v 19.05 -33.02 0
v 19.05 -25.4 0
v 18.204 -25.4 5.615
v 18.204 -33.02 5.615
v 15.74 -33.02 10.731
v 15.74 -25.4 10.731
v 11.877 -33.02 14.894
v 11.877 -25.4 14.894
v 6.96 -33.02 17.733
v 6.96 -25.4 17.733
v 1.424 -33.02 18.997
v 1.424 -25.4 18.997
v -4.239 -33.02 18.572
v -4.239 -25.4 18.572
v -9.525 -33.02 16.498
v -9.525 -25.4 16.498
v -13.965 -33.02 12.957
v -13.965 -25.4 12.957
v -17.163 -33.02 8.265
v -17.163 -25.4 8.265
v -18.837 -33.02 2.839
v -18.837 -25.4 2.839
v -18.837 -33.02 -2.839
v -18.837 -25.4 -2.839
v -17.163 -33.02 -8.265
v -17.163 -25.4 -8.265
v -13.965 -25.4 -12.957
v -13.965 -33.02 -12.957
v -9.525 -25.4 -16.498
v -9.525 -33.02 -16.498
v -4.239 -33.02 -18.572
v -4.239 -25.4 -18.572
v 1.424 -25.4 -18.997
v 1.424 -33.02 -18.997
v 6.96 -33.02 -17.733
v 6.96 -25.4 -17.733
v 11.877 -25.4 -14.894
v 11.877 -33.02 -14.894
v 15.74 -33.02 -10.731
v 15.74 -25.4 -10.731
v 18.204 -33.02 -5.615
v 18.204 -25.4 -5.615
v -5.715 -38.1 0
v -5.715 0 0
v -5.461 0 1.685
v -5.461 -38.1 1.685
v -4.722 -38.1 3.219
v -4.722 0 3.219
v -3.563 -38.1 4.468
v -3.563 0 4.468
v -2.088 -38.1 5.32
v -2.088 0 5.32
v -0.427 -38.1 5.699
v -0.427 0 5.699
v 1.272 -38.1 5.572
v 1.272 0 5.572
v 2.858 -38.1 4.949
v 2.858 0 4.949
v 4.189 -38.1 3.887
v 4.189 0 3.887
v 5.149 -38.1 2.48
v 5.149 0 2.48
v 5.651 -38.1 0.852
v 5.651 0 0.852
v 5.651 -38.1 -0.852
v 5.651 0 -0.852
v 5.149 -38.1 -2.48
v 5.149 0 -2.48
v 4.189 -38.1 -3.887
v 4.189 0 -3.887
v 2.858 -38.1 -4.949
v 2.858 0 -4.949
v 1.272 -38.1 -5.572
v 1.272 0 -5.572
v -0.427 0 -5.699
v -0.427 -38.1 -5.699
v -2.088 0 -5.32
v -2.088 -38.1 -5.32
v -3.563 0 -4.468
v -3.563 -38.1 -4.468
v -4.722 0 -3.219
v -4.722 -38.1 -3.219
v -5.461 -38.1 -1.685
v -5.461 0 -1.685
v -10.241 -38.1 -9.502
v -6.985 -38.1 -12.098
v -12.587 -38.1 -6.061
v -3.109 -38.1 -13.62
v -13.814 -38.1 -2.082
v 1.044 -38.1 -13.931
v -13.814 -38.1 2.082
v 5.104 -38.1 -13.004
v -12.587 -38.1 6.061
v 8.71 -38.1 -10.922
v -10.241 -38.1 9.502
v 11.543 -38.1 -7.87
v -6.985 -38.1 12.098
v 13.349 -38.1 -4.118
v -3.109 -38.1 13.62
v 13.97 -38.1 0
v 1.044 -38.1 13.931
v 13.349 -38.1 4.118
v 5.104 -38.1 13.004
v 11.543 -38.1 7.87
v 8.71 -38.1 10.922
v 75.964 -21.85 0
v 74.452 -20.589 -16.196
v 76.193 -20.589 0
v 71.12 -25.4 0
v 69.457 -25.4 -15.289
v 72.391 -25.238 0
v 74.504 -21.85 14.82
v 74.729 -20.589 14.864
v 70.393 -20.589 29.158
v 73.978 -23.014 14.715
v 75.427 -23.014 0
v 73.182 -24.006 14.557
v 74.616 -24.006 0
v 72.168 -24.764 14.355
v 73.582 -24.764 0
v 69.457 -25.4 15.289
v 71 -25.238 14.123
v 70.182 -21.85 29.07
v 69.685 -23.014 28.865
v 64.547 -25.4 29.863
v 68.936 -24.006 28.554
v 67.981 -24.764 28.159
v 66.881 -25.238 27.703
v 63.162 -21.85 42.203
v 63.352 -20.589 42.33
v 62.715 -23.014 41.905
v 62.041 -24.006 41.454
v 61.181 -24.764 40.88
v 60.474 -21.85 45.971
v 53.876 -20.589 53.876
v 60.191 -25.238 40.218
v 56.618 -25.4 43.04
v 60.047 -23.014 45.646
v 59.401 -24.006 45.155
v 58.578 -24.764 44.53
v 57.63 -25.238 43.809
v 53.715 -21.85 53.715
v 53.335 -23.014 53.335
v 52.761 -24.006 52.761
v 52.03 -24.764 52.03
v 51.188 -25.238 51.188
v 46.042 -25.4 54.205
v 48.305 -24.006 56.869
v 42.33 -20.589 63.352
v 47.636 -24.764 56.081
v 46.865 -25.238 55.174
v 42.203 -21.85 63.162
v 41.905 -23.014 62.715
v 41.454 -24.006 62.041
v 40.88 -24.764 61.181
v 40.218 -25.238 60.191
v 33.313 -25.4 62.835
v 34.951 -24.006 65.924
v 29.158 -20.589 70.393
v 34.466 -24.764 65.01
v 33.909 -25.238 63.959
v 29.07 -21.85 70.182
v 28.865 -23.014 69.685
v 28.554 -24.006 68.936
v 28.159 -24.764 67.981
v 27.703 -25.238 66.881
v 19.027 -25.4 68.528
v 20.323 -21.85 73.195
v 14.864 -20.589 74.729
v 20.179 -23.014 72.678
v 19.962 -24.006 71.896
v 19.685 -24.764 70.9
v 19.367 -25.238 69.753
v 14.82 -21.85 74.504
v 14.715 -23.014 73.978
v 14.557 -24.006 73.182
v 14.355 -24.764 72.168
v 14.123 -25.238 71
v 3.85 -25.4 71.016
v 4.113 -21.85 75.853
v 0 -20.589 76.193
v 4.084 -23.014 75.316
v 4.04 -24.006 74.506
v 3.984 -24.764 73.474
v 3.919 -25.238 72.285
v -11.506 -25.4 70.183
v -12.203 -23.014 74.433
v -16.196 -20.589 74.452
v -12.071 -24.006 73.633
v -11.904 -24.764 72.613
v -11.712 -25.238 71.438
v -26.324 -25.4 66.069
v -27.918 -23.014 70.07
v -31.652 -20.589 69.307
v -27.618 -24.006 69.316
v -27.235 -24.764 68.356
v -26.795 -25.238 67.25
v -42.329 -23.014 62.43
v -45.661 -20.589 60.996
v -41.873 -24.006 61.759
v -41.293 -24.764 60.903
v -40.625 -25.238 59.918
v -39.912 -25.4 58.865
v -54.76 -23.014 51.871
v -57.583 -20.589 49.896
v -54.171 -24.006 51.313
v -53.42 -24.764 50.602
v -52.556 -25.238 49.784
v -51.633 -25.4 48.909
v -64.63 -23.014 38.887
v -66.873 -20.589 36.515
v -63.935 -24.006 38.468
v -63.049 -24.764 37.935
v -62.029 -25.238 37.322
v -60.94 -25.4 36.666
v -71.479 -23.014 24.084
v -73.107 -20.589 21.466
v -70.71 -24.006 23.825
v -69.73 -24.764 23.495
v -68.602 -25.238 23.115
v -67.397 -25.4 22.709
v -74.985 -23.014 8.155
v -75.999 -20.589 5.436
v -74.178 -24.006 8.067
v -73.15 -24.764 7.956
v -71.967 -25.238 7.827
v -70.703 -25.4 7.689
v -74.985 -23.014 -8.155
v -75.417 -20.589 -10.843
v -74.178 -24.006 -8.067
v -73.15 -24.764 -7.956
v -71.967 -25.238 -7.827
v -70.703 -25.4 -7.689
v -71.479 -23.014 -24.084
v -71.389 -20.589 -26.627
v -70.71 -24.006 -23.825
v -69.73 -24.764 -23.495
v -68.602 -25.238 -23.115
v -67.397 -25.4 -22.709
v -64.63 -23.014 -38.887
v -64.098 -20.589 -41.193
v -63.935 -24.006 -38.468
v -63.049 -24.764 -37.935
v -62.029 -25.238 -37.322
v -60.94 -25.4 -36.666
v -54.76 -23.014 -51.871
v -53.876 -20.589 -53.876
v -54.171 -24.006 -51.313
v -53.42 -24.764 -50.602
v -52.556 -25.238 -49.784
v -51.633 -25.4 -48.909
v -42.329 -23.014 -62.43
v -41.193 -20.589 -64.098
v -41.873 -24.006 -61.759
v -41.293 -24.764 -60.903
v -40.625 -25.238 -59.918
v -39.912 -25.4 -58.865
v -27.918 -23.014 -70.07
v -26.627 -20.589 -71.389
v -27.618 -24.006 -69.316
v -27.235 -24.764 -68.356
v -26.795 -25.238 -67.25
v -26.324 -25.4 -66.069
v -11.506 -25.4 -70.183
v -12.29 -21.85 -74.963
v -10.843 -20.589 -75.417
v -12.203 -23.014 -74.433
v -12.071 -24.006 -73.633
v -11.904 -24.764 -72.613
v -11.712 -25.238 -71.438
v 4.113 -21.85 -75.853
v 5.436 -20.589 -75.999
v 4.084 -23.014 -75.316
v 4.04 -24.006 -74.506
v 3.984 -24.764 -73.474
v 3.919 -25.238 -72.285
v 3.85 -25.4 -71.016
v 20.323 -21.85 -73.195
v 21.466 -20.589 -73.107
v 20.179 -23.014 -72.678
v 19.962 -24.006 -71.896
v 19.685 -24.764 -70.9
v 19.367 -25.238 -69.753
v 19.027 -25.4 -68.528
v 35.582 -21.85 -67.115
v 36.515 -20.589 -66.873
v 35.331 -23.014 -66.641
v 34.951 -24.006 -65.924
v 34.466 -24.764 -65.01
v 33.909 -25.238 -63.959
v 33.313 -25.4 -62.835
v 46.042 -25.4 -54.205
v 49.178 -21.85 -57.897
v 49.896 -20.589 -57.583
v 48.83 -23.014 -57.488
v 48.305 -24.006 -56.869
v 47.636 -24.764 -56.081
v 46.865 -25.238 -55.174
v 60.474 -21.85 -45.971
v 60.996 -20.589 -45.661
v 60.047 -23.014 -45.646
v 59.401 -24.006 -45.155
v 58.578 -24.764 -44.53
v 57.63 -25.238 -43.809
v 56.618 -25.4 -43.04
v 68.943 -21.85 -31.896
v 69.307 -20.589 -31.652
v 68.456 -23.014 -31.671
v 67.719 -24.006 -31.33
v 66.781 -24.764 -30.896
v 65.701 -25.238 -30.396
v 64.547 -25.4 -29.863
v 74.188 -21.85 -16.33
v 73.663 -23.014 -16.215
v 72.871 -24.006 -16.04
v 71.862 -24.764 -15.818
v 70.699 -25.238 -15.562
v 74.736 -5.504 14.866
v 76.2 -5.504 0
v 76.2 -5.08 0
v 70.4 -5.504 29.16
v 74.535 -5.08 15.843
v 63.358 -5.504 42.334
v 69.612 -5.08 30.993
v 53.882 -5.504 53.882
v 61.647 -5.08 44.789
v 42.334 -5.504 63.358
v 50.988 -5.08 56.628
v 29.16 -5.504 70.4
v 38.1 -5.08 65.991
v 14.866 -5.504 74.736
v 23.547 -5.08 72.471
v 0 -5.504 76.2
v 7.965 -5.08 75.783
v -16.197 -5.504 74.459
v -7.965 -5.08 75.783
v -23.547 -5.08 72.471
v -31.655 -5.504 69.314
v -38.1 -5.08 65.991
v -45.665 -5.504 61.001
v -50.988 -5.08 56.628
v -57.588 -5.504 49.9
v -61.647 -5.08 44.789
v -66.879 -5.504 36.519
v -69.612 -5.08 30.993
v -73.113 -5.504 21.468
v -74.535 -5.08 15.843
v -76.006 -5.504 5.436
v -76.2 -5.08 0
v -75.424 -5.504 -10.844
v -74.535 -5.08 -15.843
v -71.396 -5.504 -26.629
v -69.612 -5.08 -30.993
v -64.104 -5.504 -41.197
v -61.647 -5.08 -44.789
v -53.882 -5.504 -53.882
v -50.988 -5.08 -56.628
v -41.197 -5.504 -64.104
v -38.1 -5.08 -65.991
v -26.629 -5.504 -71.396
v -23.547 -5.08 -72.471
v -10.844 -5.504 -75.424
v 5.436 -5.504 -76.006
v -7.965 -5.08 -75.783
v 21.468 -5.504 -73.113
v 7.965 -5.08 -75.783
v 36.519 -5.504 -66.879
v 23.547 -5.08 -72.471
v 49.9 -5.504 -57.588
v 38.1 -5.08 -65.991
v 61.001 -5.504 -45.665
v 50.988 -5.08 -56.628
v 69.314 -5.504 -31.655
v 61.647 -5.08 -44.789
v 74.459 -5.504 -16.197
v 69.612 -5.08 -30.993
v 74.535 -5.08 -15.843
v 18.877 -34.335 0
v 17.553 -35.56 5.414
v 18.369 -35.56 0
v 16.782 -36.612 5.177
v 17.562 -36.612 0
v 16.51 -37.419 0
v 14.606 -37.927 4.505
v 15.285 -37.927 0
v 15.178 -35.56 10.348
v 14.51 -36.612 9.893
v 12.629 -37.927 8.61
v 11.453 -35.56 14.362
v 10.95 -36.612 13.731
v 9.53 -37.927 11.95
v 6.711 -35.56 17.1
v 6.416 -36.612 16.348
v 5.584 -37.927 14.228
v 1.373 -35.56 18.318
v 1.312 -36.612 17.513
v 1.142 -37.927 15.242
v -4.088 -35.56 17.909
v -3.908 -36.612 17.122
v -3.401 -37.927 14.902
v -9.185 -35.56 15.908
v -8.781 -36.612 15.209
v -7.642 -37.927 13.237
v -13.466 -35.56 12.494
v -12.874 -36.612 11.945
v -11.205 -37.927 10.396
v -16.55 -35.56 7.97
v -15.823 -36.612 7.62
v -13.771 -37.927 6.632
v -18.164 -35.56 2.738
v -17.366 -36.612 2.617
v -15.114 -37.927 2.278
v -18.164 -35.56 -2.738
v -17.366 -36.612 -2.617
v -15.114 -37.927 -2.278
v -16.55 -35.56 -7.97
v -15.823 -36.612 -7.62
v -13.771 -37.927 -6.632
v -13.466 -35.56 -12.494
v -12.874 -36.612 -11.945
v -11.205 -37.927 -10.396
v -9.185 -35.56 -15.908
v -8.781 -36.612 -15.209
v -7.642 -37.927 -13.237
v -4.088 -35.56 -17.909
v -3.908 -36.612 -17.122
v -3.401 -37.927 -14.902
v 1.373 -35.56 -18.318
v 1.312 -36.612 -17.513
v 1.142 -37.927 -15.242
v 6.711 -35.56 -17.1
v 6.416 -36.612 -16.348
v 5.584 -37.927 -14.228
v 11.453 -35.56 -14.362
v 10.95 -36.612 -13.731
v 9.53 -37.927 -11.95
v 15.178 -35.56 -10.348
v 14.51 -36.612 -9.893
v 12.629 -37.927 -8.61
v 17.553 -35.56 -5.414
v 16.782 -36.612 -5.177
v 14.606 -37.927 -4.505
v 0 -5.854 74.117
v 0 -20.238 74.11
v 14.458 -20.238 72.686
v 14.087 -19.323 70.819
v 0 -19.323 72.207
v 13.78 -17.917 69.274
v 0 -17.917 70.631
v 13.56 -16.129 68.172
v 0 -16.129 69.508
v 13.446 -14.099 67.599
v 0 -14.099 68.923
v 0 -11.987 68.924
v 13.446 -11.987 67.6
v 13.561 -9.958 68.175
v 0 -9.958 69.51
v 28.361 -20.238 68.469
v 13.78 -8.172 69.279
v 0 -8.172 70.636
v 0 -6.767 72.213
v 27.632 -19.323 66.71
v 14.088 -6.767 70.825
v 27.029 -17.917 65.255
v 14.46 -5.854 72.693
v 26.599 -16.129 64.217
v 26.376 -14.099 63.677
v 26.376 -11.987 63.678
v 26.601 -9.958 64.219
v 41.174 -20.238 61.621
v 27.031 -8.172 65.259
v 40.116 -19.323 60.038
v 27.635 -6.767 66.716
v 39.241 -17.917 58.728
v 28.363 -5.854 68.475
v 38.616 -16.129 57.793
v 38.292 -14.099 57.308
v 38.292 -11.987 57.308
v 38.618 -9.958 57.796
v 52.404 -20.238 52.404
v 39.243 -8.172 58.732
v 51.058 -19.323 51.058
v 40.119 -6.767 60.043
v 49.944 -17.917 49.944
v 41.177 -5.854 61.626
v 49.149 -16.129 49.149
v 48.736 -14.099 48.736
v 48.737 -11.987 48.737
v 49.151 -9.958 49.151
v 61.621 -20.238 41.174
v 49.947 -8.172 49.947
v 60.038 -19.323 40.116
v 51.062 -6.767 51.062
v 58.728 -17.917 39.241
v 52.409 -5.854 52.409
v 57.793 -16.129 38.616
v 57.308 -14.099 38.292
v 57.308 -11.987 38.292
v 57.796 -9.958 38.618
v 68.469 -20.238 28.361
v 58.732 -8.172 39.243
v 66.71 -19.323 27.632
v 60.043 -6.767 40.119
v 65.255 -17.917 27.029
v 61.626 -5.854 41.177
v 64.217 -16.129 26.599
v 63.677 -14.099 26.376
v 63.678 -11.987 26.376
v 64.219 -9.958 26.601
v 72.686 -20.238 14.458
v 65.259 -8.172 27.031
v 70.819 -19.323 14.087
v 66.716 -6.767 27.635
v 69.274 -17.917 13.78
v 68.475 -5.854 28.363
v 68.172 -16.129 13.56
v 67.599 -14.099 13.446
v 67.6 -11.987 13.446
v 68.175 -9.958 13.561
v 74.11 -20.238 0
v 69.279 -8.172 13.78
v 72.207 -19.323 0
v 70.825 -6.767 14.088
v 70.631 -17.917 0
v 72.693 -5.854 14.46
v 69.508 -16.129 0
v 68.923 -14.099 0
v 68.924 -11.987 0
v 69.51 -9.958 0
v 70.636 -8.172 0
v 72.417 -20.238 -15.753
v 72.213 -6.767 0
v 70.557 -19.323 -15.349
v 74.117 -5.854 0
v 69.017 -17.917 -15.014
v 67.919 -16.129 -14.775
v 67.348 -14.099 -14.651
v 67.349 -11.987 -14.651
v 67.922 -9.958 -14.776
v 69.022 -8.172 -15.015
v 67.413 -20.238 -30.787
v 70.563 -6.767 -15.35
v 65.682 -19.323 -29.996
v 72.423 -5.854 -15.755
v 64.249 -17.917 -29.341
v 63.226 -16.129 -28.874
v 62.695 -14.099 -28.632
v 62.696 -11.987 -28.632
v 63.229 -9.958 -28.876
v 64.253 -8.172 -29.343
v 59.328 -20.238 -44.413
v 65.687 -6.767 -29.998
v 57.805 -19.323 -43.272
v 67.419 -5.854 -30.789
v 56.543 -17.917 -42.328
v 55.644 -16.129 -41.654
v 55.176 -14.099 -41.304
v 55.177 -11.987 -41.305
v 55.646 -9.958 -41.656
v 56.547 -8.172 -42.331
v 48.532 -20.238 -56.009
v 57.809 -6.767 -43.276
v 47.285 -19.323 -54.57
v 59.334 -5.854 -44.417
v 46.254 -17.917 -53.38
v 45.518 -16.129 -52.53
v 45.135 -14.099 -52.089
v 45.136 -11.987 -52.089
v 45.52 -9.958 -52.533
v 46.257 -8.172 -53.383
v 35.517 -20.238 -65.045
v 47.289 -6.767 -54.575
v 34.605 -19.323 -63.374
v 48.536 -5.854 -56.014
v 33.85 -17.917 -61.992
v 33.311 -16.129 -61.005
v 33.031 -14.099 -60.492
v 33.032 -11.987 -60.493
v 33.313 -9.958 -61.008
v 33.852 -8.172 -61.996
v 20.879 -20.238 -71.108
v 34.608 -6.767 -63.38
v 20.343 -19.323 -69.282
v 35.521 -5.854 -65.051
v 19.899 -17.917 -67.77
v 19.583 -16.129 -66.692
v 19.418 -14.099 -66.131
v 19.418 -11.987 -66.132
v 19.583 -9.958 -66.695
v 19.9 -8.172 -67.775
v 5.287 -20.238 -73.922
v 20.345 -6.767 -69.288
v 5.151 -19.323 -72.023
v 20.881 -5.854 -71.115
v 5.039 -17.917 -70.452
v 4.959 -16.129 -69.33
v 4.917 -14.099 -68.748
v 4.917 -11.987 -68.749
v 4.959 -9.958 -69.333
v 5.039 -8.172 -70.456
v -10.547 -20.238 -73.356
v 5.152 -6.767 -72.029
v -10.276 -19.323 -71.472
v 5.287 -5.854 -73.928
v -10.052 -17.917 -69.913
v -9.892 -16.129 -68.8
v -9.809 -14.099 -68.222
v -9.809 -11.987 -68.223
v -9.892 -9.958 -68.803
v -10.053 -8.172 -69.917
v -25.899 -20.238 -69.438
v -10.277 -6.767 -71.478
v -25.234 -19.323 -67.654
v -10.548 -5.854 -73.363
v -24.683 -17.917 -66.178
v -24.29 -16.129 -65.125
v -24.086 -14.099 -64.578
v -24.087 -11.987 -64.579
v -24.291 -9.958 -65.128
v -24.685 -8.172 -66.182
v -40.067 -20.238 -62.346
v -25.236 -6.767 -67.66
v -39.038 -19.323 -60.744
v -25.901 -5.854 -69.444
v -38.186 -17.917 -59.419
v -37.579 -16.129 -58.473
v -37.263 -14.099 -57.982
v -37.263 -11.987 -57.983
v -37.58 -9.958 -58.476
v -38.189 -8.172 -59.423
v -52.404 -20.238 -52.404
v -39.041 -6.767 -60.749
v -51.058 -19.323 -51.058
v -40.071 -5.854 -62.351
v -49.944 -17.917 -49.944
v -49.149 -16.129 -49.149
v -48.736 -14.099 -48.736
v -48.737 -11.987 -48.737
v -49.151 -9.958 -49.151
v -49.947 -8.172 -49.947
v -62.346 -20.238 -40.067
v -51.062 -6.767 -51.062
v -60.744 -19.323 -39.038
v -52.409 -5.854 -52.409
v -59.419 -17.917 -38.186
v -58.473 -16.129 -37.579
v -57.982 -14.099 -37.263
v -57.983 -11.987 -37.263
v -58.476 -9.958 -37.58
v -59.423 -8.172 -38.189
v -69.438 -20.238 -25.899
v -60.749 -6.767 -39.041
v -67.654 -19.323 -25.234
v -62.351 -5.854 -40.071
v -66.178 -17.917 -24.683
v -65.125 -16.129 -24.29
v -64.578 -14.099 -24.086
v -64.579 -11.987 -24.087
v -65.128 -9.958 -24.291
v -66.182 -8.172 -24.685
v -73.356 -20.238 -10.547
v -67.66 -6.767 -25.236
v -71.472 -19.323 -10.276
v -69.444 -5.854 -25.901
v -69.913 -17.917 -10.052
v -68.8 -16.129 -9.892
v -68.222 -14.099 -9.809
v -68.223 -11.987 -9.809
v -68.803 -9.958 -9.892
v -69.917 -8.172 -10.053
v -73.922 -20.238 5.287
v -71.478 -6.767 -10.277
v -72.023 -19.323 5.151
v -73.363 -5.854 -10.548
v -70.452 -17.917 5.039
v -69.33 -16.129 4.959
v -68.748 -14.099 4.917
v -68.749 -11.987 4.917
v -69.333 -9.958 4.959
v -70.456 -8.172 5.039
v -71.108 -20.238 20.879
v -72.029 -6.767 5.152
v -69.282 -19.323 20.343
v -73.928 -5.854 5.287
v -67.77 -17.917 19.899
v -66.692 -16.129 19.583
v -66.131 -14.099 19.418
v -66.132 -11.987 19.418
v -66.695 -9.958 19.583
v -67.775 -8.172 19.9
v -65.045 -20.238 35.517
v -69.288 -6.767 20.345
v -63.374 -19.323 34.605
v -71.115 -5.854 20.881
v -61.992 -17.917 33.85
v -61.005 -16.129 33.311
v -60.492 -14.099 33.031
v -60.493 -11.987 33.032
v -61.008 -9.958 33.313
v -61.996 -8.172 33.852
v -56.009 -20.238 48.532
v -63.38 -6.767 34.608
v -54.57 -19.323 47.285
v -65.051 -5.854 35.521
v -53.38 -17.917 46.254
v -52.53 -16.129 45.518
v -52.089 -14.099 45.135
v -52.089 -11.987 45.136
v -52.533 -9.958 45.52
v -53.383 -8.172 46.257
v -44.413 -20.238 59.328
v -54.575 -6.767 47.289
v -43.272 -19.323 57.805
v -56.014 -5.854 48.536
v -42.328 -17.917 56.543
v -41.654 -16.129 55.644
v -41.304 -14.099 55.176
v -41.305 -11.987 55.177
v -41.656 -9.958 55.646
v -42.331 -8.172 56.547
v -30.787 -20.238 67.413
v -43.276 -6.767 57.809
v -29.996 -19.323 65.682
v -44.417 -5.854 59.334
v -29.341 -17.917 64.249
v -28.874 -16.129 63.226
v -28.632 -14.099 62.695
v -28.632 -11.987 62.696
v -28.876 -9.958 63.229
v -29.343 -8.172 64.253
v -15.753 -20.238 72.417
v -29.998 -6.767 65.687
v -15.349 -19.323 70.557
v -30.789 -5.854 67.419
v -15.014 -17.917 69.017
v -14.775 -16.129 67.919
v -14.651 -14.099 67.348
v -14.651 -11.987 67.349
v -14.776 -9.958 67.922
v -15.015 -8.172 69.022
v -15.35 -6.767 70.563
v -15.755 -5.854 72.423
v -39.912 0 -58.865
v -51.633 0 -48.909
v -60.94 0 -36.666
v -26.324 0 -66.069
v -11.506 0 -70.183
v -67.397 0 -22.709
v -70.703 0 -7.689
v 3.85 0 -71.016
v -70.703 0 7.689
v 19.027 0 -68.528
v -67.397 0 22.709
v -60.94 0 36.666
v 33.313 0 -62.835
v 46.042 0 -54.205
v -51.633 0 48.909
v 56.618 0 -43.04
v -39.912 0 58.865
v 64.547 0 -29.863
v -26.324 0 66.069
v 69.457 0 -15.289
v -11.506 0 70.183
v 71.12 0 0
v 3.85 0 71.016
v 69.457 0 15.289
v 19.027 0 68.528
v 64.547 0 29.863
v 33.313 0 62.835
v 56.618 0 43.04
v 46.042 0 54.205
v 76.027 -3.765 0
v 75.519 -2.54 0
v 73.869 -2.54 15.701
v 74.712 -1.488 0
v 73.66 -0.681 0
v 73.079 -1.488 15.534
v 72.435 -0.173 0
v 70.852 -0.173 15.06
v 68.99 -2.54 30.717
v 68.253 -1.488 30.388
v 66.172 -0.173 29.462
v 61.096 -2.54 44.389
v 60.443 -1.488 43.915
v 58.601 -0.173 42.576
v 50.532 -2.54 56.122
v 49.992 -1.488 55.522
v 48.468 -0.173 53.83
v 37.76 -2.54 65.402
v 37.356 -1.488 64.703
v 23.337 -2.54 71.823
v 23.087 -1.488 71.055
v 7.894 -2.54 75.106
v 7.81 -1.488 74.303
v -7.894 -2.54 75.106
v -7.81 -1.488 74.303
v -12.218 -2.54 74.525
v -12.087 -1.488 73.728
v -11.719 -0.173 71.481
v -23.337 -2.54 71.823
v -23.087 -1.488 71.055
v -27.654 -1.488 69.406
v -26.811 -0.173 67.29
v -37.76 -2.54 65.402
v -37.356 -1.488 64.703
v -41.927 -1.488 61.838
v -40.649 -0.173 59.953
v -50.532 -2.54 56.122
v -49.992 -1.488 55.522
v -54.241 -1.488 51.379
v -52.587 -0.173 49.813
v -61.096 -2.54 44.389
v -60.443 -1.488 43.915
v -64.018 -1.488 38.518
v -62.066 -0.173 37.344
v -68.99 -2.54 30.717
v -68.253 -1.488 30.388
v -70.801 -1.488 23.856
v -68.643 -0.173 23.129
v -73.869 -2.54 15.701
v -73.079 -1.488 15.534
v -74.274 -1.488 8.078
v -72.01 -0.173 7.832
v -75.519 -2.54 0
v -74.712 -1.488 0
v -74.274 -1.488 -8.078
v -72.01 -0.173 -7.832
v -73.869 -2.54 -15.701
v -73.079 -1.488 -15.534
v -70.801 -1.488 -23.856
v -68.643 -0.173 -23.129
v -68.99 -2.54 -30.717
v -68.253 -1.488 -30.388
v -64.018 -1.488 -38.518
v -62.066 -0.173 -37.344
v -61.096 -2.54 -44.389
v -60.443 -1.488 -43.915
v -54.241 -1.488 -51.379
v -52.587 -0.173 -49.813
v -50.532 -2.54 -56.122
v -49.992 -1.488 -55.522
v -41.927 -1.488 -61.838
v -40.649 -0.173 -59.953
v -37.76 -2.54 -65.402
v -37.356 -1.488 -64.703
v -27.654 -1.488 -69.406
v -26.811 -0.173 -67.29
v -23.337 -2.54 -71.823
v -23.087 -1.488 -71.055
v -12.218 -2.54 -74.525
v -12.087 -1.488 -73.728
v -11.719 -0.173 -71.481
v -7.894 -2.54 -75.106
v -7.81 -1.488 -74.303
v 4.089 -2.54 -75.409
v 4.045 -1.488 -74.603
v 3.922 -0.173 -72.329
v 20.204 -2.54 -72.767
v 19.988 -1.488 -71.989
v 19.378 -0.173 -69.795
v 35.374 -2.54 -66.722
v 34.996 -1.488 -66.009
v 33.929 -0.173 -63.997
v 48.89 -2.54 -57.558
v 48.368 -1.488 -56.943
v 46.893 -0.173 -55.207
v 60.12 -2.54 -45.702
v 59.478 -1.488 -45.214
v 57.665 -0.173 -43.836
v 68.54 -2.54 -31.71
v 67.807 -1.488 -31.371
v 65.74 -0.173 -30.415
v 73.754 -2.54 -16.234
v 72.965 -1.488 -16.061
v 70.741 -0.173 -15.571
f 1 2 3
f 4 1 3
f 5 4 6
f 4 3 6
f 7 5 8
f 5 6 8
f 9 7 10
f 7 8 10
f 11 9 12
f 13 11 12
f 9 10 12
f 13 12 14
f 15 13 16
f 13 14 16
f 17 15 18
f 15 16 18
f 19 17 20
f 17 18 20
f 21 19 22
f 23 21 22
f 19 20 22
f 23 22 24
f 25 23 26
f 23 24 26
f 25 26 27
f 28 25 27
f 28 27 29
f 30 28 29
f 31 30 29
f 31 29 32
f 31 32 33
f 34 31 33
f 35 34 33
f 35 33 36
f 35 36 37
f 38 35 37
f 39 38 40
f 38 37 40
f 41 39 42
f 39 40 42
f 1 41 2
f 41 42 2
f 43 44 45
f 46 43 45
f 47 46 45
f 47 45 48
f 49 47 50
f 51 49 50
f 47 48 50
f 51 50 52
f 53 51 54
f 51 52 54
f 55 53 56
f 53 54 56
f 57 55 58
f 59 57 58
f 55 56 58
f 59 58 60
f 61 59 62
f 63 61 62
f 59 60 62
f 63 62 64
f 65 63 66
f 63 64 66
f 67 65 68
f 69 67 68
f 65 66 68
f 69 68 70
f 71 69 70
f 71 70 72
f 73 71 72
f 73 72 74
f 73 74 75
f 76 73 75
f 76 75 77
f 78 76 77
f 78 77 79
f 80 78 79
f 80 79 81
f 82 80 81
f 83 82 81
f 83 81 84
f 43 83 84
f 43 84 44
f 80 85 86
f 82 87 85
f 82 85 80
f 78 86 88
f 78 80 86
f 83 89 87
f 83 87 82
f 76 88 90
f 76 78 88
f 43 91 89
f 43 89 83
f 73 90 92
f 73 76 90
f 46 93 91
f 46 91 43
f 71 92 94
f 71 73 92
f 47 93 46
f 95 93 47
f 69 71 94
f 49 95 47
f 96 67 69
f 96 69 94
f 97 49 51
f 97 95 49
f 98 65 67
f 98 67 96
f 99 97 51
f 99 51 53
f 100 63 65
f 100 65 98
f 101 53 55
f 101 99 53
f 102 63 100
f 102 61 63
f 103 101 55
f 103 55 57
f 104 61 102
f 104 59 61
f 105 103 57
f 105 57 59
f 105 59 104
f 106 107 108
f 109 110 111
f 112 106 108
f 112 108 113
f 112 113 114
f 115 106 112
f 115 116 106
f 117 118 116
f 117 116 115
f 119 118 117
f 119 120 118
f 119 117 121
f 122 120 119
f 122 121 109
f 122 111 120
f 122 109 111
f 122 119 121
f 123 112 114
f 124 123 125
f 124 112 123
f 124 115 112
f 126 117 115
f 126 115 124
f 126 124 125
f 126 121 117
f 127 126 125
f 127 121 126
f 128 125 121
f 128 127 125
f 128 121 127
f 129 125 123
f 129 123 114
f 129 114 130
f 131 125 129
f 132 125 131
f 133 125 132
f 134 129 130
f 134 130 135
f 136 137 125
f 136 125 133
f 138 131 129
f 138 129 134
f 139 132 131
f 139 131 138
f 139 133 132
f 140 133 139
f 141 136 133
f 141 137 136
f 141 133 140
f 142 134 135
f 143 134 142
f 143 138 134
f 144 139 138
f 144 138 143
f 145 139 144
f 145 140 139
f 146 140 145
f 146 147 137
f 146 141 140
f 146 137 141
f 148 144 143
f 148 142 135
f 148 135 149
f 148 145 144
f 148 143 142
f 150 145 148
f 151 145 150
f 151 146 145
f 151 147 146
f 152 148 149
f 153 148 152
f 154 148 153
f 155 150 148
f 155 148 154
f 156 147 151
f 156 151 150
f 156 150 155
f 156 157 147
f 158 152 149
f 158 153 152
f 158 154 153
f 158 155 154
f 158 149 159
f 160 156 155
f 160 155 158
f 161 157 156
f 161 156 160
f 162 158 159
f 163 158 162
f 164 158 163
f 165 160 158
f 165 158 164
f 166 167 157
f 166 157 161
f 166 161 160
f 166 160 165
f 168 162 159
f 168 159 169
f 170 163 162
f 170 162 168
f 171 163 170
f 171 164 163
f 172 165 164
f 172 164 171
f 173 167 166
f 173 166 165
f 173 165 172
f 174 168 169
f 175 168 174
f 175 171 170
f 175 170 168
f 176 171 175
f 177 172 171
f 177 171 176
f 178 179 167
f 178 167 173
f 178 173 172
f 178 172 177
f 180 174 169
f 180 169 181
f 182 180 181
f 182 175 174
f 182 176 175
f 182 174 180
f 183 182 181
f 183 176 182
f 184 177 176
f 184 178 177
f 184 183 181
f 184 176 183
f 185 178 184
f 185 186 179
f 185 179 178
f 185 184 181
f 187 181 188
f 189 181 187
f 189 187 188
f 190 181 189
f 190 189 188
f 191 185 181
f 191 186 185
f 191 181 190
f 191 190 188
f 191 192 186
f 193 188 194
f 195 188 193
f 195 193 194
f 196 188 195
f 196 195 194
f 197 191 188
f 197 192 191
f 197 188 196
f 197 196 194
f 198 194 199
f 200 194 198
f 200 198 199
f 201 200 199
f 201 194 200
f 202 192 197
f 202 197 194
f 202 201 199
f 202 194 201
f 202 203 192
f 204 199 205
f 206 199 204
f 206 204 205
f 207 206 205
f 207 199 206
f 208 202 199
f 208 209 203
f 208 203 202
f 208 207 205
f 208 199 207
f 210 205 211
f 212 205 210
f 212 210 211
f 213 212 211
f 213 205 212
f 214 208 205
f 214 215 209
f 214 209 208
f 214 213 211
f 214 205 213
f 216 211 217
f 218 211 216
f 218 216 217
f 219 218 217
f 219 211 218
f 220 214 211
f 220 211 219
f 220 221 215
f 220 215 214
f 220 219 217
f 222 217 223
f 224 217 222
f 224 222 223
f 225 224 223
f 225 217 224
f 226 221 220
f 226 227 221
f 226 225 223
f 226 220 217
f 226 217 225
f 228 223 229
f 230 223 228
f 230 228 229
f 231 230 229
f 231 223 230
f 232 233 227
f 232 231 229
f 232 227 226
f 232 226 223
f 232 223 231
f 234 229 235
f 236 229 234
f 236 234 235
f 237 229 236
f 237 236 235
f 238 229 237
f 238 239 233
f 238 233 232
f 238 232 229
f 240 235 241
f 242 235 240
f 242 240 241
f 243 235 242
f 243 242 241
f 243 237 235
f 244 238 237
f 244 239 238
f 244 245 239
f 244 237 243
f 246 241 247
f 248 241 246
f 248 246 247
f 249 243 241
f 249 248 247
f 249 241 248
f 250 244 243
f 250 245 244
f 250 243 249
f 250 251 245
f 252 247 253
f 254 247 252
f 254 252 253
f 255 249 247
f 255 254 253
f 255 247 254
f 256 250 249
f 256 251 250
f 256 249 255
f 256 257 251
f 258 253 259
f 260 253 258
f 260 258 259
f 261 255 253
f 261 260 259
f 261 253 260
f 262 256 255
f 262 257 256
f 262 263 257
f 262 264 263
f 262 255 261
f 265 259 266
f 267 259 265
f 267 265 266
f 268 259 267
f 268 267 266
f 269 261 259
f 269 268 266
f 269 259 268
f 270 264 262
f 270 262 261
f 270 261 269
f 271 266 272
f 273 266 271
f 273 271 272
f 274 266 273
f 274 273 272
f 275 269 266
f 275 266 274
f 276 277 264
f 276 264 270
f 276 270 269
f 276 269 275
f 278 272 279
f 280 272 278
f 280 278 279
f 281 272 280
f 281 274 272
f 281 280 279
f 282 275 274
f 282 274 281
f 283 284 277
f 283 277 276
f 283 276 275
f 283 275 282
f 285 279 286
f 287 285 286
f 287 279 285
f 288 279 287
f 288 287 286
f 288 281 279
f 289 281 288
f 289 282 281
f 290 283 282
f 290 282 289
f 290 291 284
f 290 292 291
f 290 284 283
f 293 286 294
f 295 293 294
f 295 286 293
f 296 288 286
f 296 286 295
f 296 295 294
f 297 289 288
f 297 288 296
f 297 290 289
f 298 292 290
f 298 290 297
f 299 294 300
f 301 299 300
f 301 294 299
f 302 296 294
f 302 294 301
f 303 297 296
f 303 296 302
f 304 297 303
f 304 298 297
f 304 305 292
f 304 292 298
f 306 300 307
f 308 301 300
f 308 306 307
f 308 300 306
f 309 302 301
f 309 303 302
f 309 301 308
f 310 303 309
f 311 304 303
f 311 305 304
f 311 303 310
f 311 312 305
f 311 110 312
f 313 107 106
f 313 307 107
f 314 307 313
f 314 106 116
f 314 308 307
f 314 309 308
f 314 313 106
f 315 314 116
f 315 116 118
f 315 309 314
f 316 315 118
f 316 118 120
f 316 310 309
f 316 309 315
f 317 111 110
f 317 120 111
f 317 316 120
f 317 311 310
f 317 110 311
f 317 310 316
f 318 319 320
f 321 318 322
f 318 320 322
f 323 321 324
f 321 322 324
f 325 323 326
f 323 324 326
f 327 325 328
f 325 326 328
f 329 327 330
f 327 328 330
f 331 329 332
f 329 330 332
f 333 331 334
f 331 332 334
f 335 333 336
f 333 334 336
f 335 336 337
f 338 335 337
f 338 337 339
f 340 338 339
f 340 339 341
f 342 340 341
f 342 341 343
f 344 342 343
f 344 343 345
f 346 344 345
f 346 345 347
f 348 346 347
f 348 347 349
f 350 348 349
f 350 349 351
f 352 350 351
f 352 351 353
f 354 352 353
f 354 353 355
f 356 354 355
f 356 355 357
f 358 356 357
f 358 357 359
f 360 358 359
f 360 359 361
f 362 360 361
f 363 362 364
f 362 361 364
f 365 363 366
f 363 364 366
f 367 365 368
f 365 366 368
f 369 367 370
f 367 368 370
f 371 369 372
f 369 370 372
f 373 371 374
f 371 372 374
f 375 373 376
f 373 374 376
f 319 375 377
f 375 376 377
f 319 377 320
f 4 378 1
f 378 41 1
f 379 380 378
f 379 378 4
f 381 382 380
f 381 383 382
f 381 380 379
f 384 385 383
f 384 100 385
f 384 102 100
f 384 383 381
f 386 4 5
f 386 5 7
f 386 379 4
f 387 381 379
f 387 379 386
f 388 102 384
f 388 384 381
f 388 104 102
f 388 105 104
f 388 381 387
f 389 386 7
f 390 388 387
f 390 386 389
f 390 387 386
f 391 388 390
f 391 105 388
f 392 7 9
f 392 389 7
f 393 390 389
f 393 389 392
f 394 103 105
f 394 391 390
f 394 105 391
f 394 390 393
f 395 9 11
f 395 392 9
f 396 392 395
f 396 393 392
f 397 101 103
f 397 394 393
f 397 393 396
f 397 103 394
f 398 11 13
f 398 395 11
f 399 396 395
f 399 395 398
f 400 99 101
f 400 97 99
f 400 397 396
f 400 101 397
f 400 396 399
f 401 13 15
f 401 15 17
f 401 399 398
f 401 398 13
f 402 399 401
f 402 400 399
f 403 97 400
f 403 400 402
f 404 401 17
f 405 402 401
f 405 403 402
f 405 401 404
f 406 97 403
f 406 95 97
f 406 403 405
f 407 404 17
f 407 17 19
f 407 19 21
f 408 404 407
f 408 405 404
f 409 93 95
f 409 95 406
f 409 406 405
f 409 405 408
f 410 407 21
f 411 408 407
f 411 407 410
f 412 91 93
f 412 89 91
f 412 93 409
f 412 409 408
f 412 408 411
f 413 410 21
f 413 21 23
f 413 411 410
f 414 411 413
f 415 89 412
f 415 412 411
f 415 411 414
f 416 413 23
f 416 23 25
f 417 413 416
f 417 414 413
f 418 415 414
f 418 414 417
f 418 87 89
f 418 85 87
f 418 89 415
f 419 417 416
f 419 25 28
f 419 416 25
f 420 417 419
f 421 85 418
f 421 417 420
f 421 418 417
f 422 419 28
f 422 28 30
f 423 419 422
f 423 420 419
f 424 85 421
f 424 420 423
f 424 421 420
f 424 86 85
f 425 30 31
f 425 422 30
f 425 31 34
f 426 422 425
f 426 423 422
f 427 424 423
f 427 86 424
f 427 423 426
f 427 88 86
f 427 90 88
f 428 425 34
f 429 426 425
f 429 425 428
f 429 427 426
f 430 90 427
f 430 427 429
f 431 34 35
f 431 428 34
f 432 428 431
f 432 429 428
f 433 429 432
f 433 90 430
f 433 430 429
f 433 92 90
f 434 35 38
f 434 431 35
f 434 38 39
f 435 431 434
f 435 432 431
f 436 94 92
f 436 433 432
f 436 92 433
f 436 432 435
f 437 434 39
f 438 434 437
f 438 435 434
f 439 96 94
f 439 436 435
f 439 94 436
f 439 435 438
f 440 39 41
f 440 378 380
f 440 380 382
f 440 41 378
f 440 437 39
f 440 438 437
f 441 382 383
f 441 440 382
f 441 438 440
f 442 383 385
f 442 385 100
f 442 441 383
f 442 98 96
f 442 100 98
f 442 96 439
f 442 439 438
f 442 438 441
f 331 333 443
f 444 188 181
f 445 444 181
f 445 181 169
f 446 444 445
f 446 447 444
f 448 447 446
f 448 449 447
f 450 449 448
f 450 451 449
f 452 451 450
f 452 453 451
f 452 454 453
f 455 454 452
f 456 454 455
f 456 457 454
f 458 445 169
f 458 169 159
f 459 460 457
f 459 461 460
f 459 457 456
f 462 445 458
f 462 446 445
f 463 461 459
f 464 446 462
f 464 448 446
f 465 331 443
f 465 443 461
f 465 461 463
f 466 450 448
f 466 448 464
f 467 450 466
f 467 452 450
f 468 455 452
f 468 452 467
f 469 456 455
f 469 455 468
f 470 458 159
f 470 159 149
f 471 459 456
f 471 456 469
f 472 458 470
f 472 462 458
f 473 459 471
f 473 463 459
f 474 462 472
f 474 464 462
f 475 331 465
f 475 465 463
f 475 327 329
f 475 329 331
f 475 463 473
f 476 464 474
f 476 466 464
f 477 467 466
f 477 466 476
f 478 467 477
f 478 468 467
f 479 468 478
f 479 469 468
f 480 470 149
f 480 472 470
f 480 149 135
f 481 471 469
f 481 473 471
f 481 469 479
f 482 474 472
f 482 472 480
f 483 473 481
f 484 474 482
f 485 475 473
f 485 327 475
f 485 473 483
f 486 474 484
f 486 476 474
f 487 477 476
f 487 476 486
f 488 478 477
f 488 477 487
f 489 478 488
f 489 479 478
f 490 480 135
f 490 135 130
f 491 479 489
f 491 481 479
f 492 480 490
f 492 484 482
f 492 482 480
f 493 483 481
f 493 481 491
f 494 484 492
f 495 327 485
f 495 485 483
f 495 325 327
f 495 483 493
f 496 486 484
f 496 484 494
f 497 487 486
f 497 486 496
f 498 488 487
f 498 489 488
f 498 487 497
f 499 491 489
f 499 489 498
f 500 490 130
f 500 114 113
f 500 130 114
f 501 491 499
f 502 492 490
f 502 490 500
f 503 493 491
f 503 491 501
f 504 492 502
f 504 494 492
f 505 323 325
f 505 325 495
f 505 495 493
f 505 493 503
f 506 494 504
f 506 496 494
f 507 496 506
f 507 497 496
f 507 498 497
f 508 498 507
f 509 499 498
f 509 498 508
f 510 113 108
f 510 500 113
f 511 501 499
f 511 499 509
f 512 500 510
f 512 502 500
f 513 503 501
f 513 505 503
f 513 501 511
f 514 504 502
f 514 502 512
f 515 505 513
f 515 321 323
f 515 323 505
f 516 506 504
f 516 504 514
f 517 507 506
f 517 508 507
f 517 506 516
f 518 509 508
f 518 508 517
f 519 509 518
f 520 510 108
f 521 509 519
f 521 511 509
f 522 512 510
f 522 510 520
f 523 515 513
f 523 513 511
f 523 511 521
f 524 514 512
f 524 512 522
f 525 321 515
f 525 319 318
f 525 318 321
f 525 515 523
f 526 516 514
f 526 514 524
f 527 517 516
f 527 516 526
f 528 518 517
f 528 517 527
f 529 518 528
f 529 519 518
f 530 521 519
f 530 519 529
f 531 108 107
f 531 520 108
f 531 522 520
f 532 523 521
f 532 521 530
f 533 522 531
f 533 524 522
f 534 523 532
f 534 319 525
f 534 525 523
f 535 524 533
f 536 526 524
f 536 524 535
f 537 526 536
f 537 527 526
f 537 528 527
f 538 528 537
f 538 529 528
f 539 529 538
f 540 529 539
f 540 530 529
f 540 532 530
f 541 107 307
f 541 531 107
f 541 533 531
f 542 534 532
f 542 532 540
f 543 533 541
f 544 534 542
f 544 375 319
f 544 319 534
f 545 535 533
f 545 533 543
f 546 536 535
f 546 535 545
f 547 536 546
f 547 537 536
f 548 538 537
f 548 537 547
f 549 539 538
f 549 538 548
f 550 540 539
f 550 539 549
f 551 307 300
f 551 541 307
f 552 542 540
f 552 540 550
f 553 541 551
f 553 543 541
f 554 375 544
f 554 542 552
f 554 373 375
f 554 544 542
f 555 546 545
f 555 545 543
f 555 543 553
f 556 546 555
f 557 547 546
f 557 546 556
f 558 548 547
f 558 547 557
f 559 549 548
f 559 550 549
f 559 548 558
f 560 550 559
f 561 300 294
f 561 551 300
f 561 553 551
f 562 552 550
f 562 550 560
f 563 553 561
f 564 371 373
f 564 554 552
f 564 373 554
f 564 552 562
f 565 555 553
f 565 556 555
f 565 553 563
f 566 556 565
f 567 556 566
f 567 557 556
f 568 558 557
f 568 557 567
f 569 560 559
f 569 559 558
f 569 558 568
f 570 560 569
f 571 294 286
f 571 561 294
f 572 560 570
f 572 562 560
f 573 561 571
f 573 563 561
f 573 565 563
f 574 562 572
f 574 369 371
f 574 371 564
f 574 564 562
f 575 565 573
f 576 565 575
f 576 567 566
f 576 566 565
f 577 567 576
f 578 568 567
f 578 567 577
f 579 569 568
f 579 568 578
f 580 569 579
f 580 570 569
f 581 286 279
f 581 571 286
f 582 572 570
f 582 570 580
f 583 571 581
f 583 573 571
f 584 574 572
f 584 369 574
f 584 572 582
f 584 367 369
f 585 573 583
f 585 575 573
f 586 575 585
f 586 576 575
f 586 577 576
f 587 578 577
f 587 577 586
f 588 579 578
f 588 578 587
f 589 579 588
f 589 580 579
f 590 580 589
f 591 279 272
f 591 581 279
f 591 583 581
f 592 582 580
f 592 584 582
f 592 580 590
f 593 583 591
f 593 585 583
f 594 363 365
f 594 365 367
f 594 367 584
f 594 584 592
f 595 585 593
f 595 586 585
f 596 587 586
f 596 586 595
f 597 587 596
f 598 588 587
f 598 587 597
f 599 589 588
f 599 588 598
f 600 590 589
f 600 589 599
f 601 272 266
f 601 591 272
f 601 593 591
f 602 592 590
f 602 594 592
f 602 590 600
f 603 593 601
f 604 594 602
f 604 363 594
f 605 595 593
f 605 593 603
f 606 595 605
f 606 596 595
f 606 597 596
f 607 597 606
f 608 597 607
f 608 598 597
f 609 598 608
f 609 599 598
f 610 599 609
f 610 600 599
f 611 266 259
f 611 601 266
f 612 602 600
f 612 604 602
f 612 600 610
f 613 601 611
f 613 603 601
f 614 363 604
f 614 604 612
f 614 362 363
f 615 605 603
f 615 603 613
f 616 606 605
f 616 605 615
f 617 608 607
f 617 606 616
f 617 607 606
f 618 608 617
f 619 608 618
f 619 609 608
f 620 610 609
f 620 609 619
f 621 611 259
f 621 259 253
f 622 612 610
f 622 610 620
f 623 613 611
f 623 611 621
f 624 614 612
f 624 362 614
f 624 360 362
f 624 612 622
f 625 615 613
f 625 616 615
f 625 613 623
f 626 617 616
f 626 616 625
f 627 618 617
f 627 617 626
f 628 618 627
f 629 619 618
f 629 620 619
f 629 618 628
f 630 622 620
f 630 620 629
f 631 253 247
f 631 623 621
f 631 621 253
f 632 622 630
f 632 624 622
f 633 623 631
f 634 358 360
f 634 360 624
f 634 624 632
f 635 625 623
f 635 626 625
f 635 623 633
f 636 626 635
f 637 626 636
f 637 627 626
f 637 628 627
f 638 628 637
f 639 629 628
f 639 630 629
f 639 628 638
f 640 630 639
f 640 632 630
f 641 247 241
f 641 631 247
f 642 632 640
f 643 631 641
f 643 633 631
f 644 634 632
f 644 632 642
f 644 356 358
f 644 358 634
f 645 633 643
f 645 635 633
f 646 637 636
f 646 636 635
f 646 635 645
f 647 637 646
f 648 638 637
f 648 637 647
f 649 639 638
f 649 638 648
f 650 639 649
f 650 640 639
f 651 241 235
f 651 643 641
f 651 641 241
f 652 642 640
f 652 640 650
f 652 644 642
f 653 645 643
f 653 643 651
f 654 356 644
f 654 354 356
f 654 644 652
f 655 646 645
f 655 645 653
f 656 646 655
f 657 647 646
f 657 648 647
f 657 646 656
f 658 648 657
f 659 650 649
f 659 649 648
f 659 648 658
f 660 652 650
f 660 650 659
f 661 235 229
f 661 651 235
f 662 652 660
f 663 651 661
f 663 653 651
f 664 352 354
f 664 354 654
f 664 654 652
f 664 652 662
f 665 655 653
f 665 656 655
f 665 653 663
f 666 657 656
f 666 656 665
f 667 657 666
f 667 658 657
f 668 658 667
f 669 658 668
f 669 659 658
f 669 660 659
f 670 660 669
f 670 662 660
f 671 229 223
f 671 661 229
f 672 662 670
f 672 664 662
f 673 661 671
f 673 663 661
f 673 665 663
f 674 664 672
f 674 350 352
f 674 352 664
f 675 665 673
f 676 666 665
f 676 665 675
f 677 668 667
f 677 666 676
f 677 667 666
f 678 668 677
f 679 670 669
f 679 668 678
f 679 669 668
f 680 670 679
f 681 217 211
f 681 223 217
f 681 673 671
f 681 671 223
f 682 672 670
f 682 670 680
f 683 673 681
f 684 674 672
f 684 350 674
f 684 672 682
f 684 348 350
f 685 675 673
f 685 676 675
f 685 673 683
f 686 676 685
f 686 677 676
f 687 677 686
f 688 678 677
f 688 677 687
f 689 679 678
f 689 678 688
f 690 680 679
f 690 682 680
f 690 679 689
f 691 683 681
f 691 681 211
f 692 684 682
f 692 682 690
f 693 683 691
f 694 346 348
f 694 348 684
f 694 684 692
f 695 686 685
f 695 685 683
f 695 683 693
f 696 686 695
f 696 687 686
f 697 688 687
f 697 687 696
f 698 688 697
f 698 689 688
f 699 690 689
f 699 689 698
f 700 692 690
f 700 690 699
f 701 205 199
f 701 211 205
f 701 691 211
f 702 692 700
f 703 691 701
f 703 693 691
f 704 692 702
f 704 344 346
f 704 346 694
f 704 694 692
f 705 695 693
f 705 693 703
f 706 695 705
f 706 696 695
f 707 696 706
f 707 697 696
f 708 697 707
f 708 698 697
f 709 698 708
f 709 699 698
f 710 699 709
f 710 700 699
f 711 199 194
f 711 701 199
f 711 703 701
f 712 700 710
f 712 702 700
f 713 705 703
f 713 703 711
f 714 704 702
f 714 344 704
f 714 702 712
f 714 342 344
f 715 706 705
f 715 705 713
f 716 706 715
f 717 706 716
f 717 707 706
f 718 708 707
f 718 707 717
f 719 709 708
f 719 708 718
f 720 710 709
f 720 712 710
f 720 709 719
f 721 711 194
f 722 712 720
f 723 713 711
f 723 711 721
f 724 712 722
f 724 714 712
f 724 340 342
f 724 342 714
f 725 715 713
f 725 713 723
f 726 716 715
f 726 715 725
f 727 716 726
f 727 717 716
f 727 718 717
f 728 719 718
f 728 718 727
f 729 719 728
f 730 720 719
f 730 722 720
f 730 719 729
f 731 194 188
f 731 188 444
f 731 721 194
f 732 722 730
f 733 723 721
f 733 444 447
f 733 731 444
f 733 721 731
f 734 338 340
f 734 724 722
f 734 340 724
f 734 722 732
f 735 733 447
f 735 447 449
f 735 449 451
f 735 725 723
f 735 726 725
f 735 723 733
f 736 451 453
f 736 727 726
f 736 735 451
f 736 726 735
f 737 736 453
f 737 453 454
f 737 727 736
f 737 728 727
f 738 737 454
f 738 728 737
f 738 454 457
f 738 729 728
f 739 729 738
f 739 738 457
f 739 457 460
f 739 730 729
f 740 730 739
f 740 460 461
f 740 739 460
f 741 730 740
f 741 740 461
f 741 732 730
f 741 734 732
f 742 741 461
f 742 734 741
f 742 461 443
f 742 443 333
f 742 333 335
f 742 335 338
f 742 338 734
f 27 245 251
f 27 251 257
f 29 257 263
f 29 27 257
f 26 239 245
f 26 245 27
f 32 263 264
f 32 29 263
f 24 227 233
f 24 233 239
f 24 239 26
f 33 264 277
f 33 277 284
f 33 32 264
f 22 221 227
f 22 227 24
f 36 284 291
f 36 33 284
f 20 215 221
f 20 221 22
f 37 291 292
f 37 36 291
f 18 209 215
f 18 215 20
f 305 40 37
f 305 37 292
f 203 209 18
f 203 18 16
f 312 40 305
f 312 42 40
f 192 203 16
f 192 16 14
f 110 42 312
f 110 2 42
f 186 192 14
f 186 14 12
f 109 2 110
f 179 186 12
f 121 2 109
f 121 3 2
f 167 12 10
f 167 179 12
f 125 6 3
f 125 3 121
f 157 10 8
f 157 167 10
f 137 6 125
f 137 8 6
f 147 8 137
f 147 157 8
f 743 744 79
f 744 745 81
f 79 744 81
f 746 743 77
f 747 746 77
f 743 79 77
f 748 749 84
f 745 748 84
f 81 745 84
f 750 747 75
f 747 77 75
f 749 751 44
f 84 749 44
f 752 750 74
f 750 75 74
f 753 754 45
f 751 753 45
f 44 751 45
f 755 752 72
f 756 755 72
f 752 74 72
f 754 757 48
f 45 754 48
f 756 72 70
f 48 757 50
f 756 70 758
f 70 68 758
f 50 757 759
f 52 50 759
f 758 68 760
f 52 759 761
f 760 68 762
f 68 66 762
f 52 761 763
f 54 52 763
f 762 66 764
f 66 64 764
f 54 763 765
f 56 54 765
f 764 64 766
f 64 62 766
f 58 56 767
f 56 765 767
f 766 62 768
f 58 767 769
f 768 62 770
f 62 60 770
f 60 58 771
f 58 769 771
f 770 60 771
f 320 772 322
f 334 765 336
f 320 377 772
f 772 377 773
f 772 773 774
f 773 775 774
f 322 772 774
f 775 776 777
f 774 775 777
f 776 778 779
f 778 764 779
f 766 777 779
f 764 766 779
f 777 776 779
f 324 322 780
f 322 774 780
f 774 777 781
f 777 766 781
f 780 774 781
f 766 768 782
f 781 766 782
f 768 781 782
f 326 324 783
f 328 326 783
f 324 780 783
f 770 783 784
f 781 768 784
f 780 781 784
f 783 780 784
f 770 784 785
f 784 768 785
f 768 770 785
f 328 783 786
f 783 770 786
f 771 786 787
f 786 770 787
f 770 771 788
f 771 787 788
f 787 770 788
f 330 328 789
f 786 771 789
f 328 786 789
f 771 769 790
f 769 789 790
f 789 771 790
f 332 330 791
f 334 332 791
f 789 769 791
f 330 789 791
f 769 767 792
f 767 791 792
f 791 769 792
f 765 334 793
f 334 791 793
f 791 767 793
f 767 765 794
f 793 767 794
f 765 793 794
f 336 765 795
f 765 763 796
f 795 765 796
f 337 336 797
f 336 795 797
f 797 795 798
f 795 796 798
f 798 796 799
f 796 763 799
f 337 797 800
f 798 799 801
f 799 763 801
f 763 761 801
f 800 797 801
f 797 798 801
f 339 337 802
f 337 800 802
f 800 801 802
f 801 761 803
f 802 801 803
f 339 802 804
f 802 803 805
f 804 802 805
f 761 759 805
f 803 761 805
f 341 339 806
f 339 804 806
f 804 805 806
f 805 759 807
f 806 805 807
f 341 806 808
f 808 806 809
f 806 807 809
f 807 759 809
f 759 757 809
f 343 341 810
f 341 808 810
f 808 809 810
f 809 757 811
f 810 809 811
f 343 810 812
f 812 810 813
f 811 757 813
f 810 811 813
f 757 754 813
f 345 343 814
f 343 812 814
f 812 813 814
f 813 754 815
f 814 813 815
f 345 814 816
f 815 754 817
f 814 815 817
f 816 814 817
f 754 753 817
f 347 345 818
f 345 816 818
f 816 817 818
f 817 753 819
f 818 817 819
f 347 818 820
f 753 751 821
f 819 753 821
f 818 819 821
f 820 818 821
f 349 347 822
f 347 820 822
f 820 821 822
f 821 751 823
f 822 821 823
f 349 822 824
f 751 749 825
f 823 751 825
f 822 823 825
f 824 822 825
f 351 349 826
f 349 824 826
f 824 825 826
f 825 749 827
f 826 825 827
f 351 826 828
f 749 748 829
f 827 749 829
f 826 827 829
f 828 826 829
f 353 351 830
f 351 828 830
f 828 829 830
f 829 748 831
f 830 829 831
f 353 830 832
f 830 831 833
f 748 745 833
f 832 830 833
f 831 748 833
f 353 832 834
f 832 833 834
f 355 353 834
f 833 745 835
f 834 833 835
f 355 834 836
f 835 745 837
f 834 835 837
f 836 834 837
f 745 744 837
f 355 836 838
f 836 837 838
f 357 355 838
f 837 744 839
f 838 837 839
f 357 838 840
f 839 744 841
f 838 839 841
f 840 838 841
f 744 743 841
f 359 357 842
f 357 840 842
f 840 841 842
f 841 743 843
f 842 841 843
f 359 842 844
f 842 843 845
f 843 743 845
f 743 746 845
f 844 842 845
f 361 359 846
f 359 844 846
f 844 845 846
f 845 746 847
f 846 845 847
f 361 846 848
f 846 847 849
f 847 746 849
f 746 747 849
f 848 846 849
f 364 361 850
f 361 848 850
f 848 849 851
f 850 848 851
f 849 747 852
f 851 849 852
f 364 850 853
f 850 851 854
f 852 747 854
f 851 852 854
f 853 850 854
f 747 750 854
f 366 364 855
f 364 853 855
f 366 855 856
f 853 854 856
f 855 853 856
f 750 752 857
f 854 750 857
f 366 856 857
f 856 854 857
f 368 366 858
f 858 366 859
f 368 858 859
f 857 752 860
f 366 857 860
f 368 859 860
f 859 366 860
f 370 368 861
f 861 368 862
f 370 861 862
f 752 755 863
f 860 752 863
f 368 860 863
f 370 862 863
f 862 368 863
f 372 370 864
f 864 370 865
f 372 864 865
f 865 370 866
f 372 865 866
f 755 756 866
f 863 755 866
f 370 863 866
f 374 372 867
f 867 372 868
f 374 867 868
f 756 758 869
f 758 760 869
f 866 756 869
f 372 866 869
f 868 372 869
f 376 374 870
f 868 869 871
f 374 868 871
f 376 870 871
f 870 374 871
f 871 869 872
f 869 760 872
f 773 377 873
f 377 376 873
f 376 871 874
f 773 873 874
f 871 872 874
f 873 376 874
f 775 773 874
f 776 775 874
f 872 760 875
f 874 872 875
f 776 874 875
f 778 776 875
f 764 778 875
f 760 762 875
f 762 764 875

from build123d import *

# Parameters (mm, degrees)
F0_R     = 76.2
F1_DEPTH = 25.4
F2_R     = 19.05
F3_DEPTH = 12.7
F5_D     = 11.43
F6_R     = 5.08
F7_R     = 7.545148


with BuildPart() as f1:
    # F0 (on Front) → F1 (new body)
    with BuildSketch(Plane.XZ):
        Circle(F0_R)
    extrude(amount=F1_DEPTH)

    # F2 (on face) → F3 (join)
    with BuildSketch(Plane.XZ.offset(25.4)):
        Circle(F2_R)
    extrude(amount=F3_DEPTH)

    # F5 (through all)
    with Locations(Plane.XZ.offset(38.1)):
        with Locations((0, 0)):
            Hole(F5_D / 2)

    # F6
    f6_edges = [f1.edges().sort_by_distance(p)[0] for p in [
        (-76.2, -25.4, 0),
        (76.2, -12.7, 0),
        (-76.2, 0, 0),
        (-19.05, -38.1, 0),
    ]]
    fillet(f6_edges, radius=F6_R)

    # F7 (on Right) → F8 (revolve, cut)
    with BuildSketch(Plane.YZ):
        with Locations((-13.046818, 76.394618)):
            Circle(F7_R)
    revolve(axis=Axis((0, 0, 0), (0, 1, 0)), mode=Mode.SUBTRACT)


solid = f1.part
